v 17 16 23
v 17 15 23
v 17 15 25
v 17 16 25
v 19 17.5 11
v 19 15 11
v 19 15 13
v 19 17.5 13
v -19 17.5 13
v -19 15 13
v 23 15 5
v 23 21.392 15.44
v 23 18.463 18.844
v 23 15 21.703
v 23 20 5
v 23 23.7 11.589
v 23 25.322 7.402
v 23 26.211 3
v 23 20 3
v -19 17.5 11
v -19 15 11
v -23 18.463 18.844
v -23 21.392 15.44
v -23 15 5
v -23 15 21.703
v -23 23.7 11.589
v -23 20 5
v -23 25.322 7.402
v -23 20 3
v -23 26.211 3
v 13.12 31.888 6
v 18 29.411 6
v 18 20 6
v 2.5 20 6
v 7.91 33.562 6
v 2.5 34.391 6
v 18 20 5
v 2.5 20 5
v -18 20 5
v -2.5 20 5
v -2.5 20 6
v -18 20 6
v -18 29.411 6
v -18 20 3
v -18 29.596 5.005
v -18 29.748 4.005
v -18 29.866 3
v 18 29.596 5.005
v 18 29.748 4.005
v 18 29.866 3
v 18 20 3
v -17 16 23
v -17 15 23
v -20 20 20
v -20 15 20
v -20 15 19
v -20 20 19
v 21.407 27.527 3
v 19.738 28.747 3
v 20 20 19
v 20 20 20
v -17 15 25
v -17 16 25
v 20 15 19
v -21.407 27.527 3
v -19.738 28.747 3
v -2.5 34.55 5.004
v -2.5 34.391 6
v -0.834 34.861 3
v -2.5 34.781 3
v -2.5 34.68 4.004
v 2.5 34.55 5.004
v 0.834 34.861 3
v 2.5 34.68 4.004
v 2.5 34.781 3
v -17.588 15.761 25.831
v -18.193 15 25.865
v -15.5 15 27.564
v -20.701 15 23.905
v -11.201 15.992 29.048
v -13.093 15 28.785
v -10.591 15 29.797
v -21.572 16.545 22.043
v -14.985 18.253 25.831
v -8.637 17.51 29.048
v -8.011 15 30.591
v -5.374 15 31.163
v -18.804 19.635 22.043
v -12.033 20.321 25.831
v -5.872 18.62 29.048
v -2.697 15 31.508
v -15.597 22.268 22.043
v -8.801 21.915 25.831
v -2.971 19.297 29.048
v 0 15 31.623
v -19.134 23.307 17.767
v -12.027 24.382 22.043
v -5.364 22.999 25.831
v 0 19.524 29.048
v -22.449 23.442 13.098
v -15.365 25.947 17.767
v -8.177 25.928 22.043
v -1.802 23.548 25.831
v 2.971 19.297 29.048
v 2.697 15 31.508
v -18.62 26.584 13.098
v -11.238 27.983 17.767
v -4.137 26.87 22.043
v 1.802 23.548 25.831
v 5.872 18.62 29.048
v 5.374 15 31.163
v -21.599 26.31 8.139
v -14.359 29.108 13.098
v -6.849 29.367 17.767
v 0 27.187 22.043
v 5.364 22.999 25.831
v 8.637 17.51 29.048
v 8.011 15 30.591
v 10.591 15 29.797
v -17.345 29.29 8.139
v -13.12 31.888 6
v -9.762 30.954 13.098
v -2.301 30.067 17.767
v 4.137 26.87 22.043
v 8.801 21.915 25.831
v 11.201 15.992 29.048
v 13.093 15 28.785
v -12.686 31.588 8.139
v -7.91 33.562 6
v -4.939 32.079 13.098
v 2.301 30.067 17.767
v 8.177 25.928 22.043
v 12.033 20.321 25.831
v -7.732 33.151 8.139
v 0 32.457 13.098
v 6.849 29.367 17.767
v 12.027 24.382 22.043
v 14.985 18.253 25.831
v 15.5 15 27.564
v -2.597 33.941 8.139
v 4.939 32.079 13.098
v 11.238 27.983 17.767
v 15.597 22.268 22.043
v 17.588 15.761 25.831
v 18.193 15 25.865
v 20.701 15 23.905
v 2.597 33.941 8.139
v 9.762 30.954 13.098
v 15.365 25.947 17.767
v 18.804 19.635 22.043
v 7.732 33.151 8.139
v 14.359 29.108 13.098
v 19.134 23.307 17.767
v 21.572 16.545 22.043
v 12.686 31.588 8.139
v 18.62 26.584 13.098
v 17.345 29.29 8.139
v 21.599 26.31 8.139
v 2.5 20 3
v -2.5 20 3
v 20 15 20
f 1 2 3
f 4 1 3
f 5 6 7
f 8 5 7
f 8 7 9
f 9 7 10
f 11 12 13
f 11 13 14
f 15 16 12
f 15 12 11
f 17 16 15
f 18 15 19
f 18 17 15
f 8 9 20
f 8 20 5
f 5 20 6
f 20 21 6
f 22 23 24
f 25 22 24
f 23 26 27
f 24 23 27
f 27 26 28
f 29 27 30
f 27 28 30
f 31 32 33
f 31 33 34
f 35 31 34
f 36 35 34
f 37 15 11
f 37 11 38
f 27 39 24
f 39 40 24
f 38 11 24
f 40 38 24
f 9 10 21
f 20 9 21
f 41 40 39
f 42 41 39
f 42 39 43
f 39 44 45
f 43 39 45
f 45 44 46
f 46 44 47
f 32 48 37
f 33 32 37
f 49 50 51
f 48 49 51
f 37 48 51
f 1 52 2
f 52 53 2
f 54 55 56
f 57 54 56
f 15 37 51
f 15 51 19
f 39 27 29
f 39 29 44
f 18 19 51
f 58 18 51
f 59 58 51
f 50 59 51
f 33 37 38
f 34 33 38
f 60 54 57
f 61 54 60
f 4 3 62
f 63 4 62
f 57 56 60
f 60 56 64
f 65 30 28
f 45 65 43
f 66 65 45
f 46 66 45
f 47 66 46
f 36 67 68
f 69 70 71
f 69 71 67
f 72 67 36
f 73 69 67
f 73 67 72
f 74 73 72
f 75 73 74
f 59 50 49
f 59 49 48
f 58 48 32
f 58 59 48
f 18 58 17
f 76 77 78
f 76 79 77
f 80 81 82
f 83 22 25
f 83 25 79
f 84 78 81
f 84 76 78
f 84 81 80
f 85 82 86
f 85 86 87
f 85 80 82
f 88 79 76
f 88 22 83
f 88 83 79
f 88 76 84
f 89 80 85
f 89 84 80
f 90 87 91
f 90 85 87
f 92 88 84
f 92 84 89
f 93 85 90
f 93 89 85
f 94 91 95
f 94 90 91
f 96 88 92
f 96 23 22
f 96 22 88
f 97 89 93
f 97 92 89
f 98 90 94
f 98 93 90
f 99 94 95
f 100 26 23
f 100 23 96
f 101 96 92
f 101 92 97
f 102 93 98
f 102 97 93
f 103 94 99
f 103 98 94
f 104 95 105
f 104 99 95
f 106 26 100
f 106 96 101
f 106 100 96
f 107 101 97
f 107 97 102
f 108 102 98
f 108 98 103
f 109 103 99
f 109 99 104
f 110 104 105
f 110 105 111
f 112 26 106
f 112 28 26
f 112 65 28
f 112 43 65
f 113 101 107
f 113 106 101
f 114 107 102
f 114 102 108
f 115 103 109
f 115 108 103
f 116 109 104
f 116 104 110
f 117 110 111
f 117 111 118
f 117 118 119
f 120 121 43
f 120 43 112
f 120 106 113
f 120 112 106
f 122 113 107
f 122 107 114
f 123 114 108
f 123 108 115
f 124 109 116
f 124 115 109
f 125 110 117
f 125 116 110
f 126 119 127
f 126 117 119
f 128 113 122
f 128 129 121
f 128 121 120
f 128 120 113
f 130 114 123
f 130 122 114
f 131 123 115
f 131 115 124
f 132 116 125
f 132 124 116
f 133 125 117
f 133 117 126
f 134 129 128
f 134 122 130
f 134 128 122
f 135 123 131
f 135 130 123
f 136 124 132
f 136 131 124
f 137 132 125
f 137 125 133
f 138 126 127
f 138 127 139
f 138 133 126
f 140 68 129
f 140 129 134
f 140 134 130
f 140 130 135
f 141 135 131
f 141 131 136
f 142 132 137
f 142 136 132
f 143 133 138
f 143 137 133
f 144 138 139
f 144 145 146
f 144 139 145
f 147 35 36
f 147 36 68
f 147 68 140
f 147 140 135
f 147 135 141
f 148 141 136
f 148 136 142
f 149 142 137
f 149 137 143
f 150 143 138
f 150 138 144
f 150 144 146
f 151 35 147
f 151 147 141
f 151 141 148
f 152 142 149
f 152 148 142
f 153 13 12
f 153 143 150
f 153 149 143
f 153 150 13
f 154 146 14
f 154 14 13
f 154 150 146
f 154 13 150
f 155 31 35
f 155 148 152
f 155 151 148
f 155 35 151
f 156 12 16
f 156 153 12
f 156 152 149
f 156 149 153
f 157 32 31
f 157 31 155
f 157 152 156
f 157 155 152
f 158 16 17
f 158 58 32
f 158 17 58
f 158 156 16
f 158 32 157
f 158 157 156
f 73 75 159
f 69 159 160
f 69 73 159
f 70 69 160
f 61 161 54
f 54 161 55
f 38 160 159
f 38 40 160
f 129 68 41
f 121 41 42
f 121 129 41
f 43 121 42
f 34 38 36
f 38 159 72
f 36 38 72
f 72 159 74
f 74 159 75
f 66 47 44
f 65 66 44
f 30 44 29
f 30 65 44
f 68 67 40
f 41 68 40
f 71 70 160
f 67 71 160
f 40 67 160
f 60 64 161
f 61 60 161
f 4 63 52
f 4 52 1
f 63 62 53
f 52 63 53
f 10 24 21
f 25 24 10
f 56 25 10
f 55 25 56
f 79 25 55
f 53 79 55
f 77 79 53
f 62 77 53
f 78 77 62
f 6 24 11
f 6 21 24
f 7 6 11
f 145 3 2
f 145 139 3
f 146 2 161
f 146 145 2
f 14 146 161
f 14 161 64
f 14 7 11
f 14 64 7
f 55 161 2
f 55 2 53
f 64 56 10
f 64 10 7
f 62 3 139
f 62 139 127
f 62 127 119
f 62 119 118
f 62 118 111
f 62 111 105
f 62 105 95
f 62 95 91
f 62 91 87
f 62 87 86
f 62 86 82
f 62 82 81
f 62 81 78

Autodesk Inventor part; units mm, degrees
ref_plane "YZ Plane" through (0, 0, 0) normal (1, 0, 0) x (0, 1, 0)
sketch "スケッチ1" plane through (0, 0, 0) normal (0, 1, 0) x (-1, 0, 0)
  circle A0 centre (0, 0) radius 35
  line L0 (0, 0) -> (0, -35)
  line L1 (0, 0) -> (0, 35)
  dimension "d0" = 70
revolve "回転1" add sketch "スケッチ1" angle 180 about axis through (0, 0, 0) along (0, 0, 1) picked at (-2.5961, -23.0408) contours L1 L0 A0
sketch "スケッチ5" plane through (0, 0, 0) normal (0, -1, 0) x (1, 0, 0)
  line L0 (-20, -23) -> (20, -23)
  line L1 (20, -23) -> (20, -13)
  line L2 (20, -13) -> (-20, -13)
  line L3 (-20, -13) -> (-20, -23)
  line L4 (-20, -15) -> (-20, -13)
  line L5 (0, 25) -> (-17, 25)
  line L6 (-17, 25) -> (-17, 23)
  line L7 (-17, 23) -> (0, 23)
  line L8 (0, 23) -> (0, 25)
  line L9 (0, 20) -> (-20, 20)
  line L10 (-20, 20) -> (-20, 19)
  line L11 (-20, 19) -> (0, 19)
  line L12 (0, 19) -> (0, 20)
  line L13 (0, 13) -> (-19, 13)
  line L14 (-19, 13) -> (-19, 11)
  line L15 (-19, 11) -> (0, 11)
  line L16 (0, 11) -> (0, 13)
  line L17 (0, 5) -> (-23, 5)
  line L18 (-23, 5) -> (-23, 3)
  line L19 (-23, 3) -> (0, 3)
  line L20 (0, 3) -> (0, 5)
  circle A0 centre (0, 0) radius 35 projected
  circle A1 centre (0, 0) radius 35 projected
  line L21 (0, 35) -> (0, -35)
  line L22 (35, 0) -> (-35, 0)
  line L23 (-32, 2) -> (-23, 2)
  line L24 (-23, 2) -> (-23, -8)
  line L25 (-23, -8) -> (-32, -8)
  line L26 (-32, -8) -> (-32, 2)
  line L27 (-23, -8.0262) -> (-23, 2)
  line L28 (-27, 22.2711) -> (-27, -22.2711)
  line L29 (-15.5, 25) -> (0, 25)
  line L30 (0, 25) -> (0, 35)
  line L31 (0, 35) -> (-15.5, 35)
  line L32 (-15.5, 35) -> (-15.5, 25)
  line L33 (-15.5, 23) -> (0, 23)
  line L34 (0, 23) -> (0, 20)
  line L35 (0, 20) -> (-15.5, 20)
  line L36 (-15.5, 20) -> (-15.5, 23)
  line L37 (-16, 13) -> (0, 13)
  line L38 (0, 13) -> (0, 19)
  line L39 (0, 19) -> (-16, 19)
  line L40 (-16, 19) -> (-16, 13)
  line L41 (-16, 11) -> (0, 11)
  line L42 (0, 11) -> (0, 5)
  line L43 (0, 5) -> (-16, 5)
  line L44 (-16, 5) -> (-16, 11)
  line L45 (-23, -3) -> (-39.6865, -3)
  line L46 (-23, -3) -> (-7.8337, -3)
  line L47 (-8, 3) -> (-23, 3)
  line L48 (-23, 3) -> (-23, -9)
  line L49 (-23, -9) -> (-8, -9)
  line L50 (-8, -9) -> (-8, 3)
  line L51 (-8, 3) -> (-23, -9) construction
  line L52 (-23, 3) -> (-8, -9) construction
  line L53 (-23, 4) -> (-33, 4)
  line L54 (-33, 4) -> (-33, -10)
  line L55 (-33, -10) -> (-23, -10)
  line L56 (-23, -10) -> (-23, 4)
  line L57 (-23, 4) -> (-33, -10) construction
  line L58 (-33, 4) -> (-23, -10) construction
  line L59 (-8, 3) -> (-1, 3)
  line L60 (-1, 3) -> (-1, -9)
  line L61 (-1, -9) -> (-8, -9)
  line L62 (-8, -9) -> (-8, 3)
  line L63 (-8, 3) -> (-1, -9) construction
  line L64 (-1, 3) -> (-8, -9) construction
  line L65 (-23, 2) -> (-27, 2)
  line L66 (-23, -8) -> (-27, -8)
  line L67 (-23, 4) -> (-27, 4)
  line L68 (-23, -10) -> (-27, -10)
  line L69 (23.4307, -26) -> (-23.4307, -26)
  line L70 (-8, 3) -> (-6.8, 3)
  line L71 (-6.8, 3) -> (-6.8, -9)
  line L72 (-6.8, -9) -> (-8, -9)
  line L73 (-8, -9) -> (-8, 3)
  line L74 (-3, 5) -> (0, 5)
  line L75 (0, 20) -> (-4, 20)
  line L76 (-4, 19) -> (0, 19)
  line L77 (0, 19) -> (0, 20)
  line L78 (-6, 5) -> (-1, 5)
  line L79 (-1, 3) -> (-6, 3)
  point P0 (0, -23)
  point P1 (0, -13)
  point P2 (0, 24)
  point P3 (0, 19.5)
  point P4 (0, 12)
  point P5 (0, 4)
  point P6 (-20, -18)
  point P7 (-27, -0.5262)
  point P8 (-27, -8)
  point P9 (-15.5, 21.5)
  point P10 (-15.5, 31.3807)
  point P11 (0, 25)
  point P12 (0, 23)
  point P13 (0, 11)
  point P14 (0, 13)
  point P15 (-27, 0)
  point P16 (-32, 0)
  point P17 (-23, 0)
  point P18 (-15.5, -3)
  point P19 (-28, -3)
  point P20 (-4.5, -3)
  point P21 (-8, -9)
  point P22 (-8, 3)
  point P23 (-27, 0.5)
  point P24 (-28, 0.4738)
  point P25 (-28, -11.5262)
  point P26 (-27, -11.5)
  point P27 (-23, 2)
  point P28 (-23, 2)
  point P29 (-8, 0)
  point P30 (-1, 0)
  point P31 (0, 19)
  point P32 (0, 20)
  point P33 (-27, -10)
  point P34 (-27, 4)
  dimension "d12" = 40
  dimension "d13" = 10
  dimension "d23" = 17
  dimension "d24" = 2
  dimension "d27" = 20
  dimension "d28" = 1
  dimension "d30" = 19
  dimension "d31" = 2
  dimension "d33" = 2
  dimension "d88" = 0
  dimension "d89" = 0
  dimension "d90" = 12
  dimension "d92" = 20
  dimension "d93" = 10
  dimension "d97" = 9
  dimension "d98" = 10
  dimension "d113" = 27
  dimension "d122" = 15.5
  dimension "d123" = 35
  dimension "d124" = 3
  dimension "d125" = 15.5
  dimension "d126" = 6
  dimension "d127" = 6
  dimension "d128" = 16
  dimension "d129" = 16
  dimension "d147" = 12
  dimension "d149" = 8
  dimension "d151" = 15
  dimension "d161" = 14
  dimension "d162" = 10
  dimension "d164" = 12
  dimension "d165" = 7
  dimension "d170" = 26
  dimension "d175" = 1.2
  dimension "d207" = 0
extrude "GNSボード" cut sketch "スケッチ5" against normal blind 16 contours L8 L7 L6 L5
extrude "GNSボード止めるよう" cut sketch "スケッチ5" against normal blind 15 contours L21 L5 L32 A0 | L21 L9 L36 L7
extrude "アルミ板１" cut sketch "スケッチ5" against normal blind 20 contours L11 L10 L9 L12
extrude "メイン基板" cut sketch "スケッチ5" against normal blind 17.5 contours L15 L14 L13 L16
extrude "メイン止めるよう" cut sketch "スケッチ5" against normal blind 14.5 contours L17 L44 L15 L21 | L13 L40 L11 L21
extrude "アルミ板２" cut sketch "スケッチ5" against normal blind 20 contours L19 L18 L17 L20
extrude "電池ボックス入れ" cut sketch "スケッチ5" against normal blind 13 contours L3 L2 L21 L0 | L21 L2 L1 L0
extrude "side ut" cut sketch "スケッチ5" against normal blind 100 contours A0 L45 L54 L55 L28 | A0 L22 L54 L45 | L55 L54 L45 L26 L25 L28 | A0 L28 L53 L54 L22 | L54 L22 L26 L45 | L25 L26 L45 L28 | L54 L53 L28 L23 L26 L22 | L26 L22 L28 L45 | L22 L26 L23 L28
extrude "motor case" add sketch "スケッチ5" against normal blind 7 contours L55 L54 L45 L26 L25 L28 | L28 L25 L27 L48 L56 L55 | L50 L46 L24 L22 | L22 L24 L48 L19 L50 | L54 L22 L26 L45 | L28 L45 L24 L25 | L25 L26 L45 L28 | L24 L45 L28 L22 | L22 L28 L23 L24 | L50 L49 L48 L27 L24 L46 | L54 L53 L28 L23 L26 L22 | L26 L22 L28 L45 | L53 L18 L48 L23 L28 | L22 L26 L23 L28
extrude "bottom cut" cut sketch "スケッチ5" against normal blind 90 contours L69 A0 L21 | L21 A0 L69
extrude "motor" cut sketch "スケッチ5" against normal blind 6 contours L60 L61 L71 L22 | L22 L71 L19 L60 | L71 L61 L50 L22 | L22 L50 L19 L71 | L50 L46 L24 L22 | L22 L24 L48 L19 L50 | L28 L45 L24 L25 | L25 L26 L45 L28 | L24 L45 L28 L22 | L22 L28 L23 L24 | L50 L49 L48 L27 L24 L46 | L26 L22 L28 L45 | L22 L26 L23 L28
extrude "motor block" add sketch "スケッチ5" against normal blind 10 contours L71 L61 L50 L22 | L22 L50 L19 L71
sketch "スケッチ27" plane through (-33, 0, -10) normal (-1, 0, 0) x (0, 0, 1)
  line L0 (14, 0) -> (0, 0) projected
  circle A0 centre (7, 0) radius 3
  point P0 (10, 0)
  dimension "d198" = 6
extrude "押し出し36" cut sketch "スケッチ27" against normal blind 27
mirror "ミラー13" about plane through (0, 0, 0) normal (1, 0, 0) of "メイン止めるよう", "メイン基板", "アルミ板１", "GNSボード止めるよう", "GNSボード", "アルミ板２", "motor", "motor case", "押し出し36", "電池ボックス入れ", "side ut", "motor block"
ref_plane "作業平面5" through (-17, 17.5, 23) normal (0, -1, 0) x (1, 0, 0)
ref_plane "作業平面6" through (20, 13, -13) normal (0, 0, -1) x (1, 0, 0)
sketch "スケッチ38" plane through (20, 13, -13) normal (0, 0, -1) x (1, 0, 0)
  line L0 (-40, 13) -> (0, 13) projected
  line L1 (-40, 13) -> (-40, 0) projected
  line L2 (-40, 0) -> (0, 0) projected
  line L3 (0, 13) -> (0, 0) projected
  line L4 (-38, 6) -> (-28, 6)
  line L5 (-28, 6) -> (-28, -3)
  line L6 (-28, -3) -> (-38, -3)
  line L7 (-38, -3) -> (-38, 6)
  point P0 (-20, 13)
  dimension "d235" = 3
  dimension "d236" = 9
  dimension "d237" = 10
  dimension "d238" = 2
extrude "押し出し44" cut sketch "スケッチ38" against normal blind 18 contours L7 L4 L5 L2 | L2 L5 L6 L7
ref_plane "作業平面7" through (27, 35, 4) normal (0, -1, 0) x (1, 0, 0)
sketch "スケッチ41" plane through (-17, 0, 23) normal (0, -1, 0) x (1, 0, 0)
  line L0 (-16, -23) -> (-15, -23) projected
  line L1 (-15, -23) -> (-15, -21) projected
  line L2 (-15, -21) -> (-6, -21) projected
  line L3 (-6, -21) -> (-6, -18) projected
  line L4 (-6, -18) -> (1, -18) projected
  line L5 (1, -18) -> (1, -12) projected
  line L6 (1, -12) -> (-2, -12) projected
  line L7 (-2, -12) -> (-2, -10) projected
  line L8 (-2, -10) -> (1, -10) projected
  line L9 (1, -10) -> (1, -4) projected
  line L10 (1, -4) -> (-3, -4) projected
  line L11 (-3, -4) -> (-3, -3) projected
  line L12 (-3, -3) -> (1.5, -3) projected
  line L13 (1.5, -3) -> (1.5, 0) projected
  line L14 (1.5, 0) -> (0, 0) projected
  line L15 (0, 0) -> (0, 2) projected
  line L16 (0, 2) -> (1.5, 2) projected
  line L17 (1.5, 2) -> (1.5, 8.3807) projected
  arc A0 (1.5, 8.3807) -> (-10, -0.7289) centre (17, -23) ccw projected
  line L18 (-10, -0.7289) -> (-10, -19) projected
  line L19 (-10, -19) -> (-16, -19) projected
  line L20 (-16, -19) -> (-16, -23) projected
  line L21 (1, -18) -> (1, -12) projected
  line L22 (-2, -10) -> (-2, -12) projected
  line L23 (0, 2) -> (0, 0) projected
  circle A1 centre (-4, 0) radius 2
  dimension "d252" = 4
  dimension "d253" = 4
  dimension "d254" = 3
extrude "押し出し46" cut sketch "スケッチ41" against normal blind 10 contours A1
mirror "ミラー15" about plane through (0, 0, 0) normal (1, 0, 0) of "押し出し46"
sketch "スケッチ42" plane through (-33, 0, -10) normal (0, -1, 0) x (1, 0, 0)
  circle A0 centre (9.5, -8) radius 2
  line L0 (13, -13) -> (13, -3) projected
  line L1 (10, 2) -> (1, 2) projected
  point P0 (33, 10)
  dimension "d257" = 3.5
  dimension "d258" = 4
  dimension "d259" = 10
extrude "押し出し47" cut sketch "スケッチ42" against normal blind 10
mirror "ミラー16" about plane through (0, 0, 0) normal (1, 0, 0) of "押し出し47"
ref_plane "作業平面8" through (-17, 15, 23) normal (0, -1, 0) x (1, 0, 0)
sketch "スケッチ45" plane through (-17, 15, 23) normal (0, -1, 0) x (1, 0, 0)
  circle A0 centre (-4, 0) radius 2 projected
  line L0 (-16, -23) -> (-15, -23) projected
  line L1 (-15, -23) -> (-15, -21) projected
  line L2 (-15, -21) -> (-6, -21) projected
  line L3 (-6, -21) -> (-6, -18) projected
  line L4 (-6, -18) -> (1, -18) projected
  line L5 (1, -18) -> (1, -12) projected
  line L6 (1, -12) -> (-2, -12) projected
  line L7 (-2, -12) -> (-2, -10) projected
  line L8 (-2, -10) -> (1, -10) projected
  line L9 (1, -10) -> (1, -4) projected
  line L10 (1, -4) -> (-3, -4) projected
  line L11 (-3, -4) -> (-3, -3) projected
  line L12 (-3, -3) -> (1.5, -3) projected
  line L13 (1.5, -3) -> (1.5, 0) projected
  line L14 (1.5, 0) -> (0, 0) projected
  line L15 (0, 0) -> (0, 2) projected
  line L16 (0, 2) -> (1.5, 2) projected
  line L17 (1.5, 2) -> (1.5, 8.3807) projected
  arc A1 (1.5, 8.3807) -> (-10, -0.7289) centre (17, -23) ccw projected
  line L18 (-10, -0.7289) -> (-10, -19) projected
  line L19 (-10, -19) -> (-16, -19) projected
  line L20 (-16, -19) -> (-16, -23) projected
  arc A2 (32.5, 4.5636) -> (1.5, 4.5636) centre (17, -23) ccw projected
  line L21 (1.5, 2) -> (1.5, 4.5636) projected
  line L22 (32.5, 2) -> (1.5, 2) projected
  line L23 (32.5, 2) -> (32.5, 4.5636) projected
  circle A3 centre (38, 0) radius 2 projected
  circle A4 centre (38, 0) radius 2 projected
  line L24 (49, -23) -> (50, -23) projected
  line L25 (50, -19) -> (50, -23) projected
  line L26 (44, -19) -> (50, -19) projected
  line L27 (44, -19) -> (44, -0.7289) projected
  arc A5 (44, -0.7289) -> (32.5, 8.3807) centre (17, -23) ccw projected
  line L28 (32.5, 8.3807) -> (32.5, 2) projected
  line L29 (32.5, 2) -> (34, 2) projected
  line L30 (34, 2) -> (34, 0) projected
  line L31 (34, 0) -> (32.5, 0) projected
  line L32 (32.5, 0) -> (32.5, -3) projected
  line L33 (32.5, -3) -> (37, -3) projected
  line L34 (37, -3) -> (37, -4) projected
  line L35 (37, -4) -> (33, -4) projected
  line L36 (33, -4) -> (33, -10) projected
  line L37 (33, -10) -> (36, -10) projected
  line L38 (36, -10) -> (36, -12) projected
  line L39 (36, -12) -> (33, -12) projected
  line L40 (33, -12) -> (33, -18) projected
  line L41 (33, -18) -> (40, -18) projected
  line L42 (40, -18) -> (40, -21) projected
  line L43 (40, -21) -> (49, -21) projected
  line L44 (49, -21) -> (49, -23) projected
  circle A6 centre (-4, 0) radius 2 projected
  line L45 (1.5, 0) -> (32.5, 0) projected
  line L46 (32.5, -3) -> (1.5, -3) projected
  line L47 (32.5, -3) -> (32.5, 0) projected
  line L48 (1.5, 0) -> (32.5, 0) projected
  line L49 (1.5, -3) -> (1.5, 0) projected
  line L50 (34, 0) -> (0, 0) projected
  line L51 (34, 0) -> (34, 2) projected
  line L52 (34, 2) -> (0, 2) projected
  line L53 (0, 0) -> (0, 2) projected
  line L54 (33, -10) -> (1, -10) projected
  line L55 (33, -10) -> (33, -4) projected
  line L56 (1, -4) -> (33, -4) projected
  line L57 (1, -10) -> (1, -4) projected
  line L58 (36, -12) -> (-2, -12) projected
  line L59 (36, -12) -> (36, -10) projected
  line L60 (36, -10) -> (-2, -10) projected
  line L61 (-2, -12) -> (-2, -10) projected
  line L62 (33, -18) -> (1, -18) projected
  line L63 (33, -18) -> (33, -12) projected
  line L64 (1, -12) -> (33, -12) projected
  line L65 (1, -18) -> (1, -12) projected
  line L66 (40, -20) -> (-6, -20) projected
  line L67 (40, -20) -> (40, -18) projected
  line L68 (40, -18) -> (-6, -18) projected
  line L69 (-6, -20) -> (-6, -18) projected
  circle A7 centre (40.5, -41) radius 2 projected
  circle A8 centre (-6.5, -41) radius 2 projected
  line L70 (25, -29) -> (23.8, -29) projected
  line L71 (23.8, -32) -> (23.8, -29) projected
  line L72 (23.8, -32) -> (18, -32) projected
  line L73 (18, -32) -> (18, -20) projected
  line L74 (18, -20) -> (16, -20) projected
  line L75 (16, -20) -> (16, -32) projected
  line L76 (16, -32) -> (10.2, -32) projected
  line L77 (10.2, -32) -> (10.2, -29) projected
  line L78 (10.2, -29) -> (9, -29) projected
  line L79 (9, -29) -> (9, -32) projected
  line L80 (9, -32) -> (-6, -32) projected
  line L81 (-6, -32) -> (-6, -31) projected
  line L82 (-6, -31) -> (-15, -31) projected
  line L83 (-15, -31) -> (-15, -29) projected
  line L84 (-15, -29) -> (-16, -29) projected
  line L85 (-16, -29) -> (-16, -33) projected
  line L86 (-16, -33) -> (-10, -33) projected
  line L87 (-10, -33) -> (-10, -45.2711) projected
  arc A9 (-10, -45.2711) -> (-6.4307, -49) centre (17, -23) ccw projected
  line L88 (-6.4307, -49) -> (40.4307, -49) projected
  arc A10 (40.4307, -49) -> (44, -45.2711) centre (17, -23) ccw projected
  line L89 (44, -45.2711) -> (44, -33) projected
  line L90 (50, -33) -> (44, -33) projected
  line L91 (50, -29) -> (50, -33) projected
  line L92 (50, -29) -> (49, -29) projected
  line L93 (49, -29) -> (49, -31) projected
  line L94 (49, -31) -> (40, -31) projected
  line L95 (40, -31) -> (40, -32) projected
  line L96 (40, -32) -> (25, -32) projected
  line L97 (25, -29) -> (25, -32) projected
  line L98 (-3, -36) -> (37, -36) projected
  line L99 (37, -36) -> (37, -46) projected
  line L100 (37, -46) -> (-3, -46) projected
  line L101 (-3, -46) -> (-3, -36) projected
  line L102 (-6, -18) -> (40, -18)
  line L103 (40, -18) -> (40, 8.6228)
  line L104 (40, 8.6228) -> (-6, 8.6228)
  line L105 (-6, 8.6228) -> (-6, -18)
  arc A11 (32.5, 4.5636) -> (1.5, 4.5636) centre (17, -23) ccw projected
  line L106 (32.5, 4.5636) -> (32.5, 8.3807) projected
  arc A12 (44, -0.7289) -> (32.5, 8.3807) centre (17, -23) ccw projected
  line L107 (44, -0.7289) -> (44, -45.2711) projected
  arc A13 (40.4307, -49) -> (44, -45.2711) centre (17, -23) ccw projected
  line L108 (40.4307, -49) -> (-6.4307, -49) projected
  arc A14 (-10, -45.2711) -> (-6.4307, -49) centre (17, -23) ccw projected
  line L109 (-10, -45.2711) -> (-10, -0.7289) projected
  arc A15 (1.5, 8.3807) -> (-10, -0.7289) centre (17, -23) ccw projected
  line L110 (1.5, 8.3807) -> (1.5, 4.5636) projected
  line L111 (9, -32) -> (9, -20) projected
  line L112 (-6, -20) -> (9, -20) projected
  line L113 (-6, -21) -> (-6, -20) projected
  line L114 (-15, -21) -> (-6, -21) projected
  line L115 (-15, -31) -> (-15, -21) projected
  line L116 (-6, -31) -> (-15, -31) projected
  line L117 (-6, -32) -> (-6, -31) projected
  line L118 (9, -32) -> (-6, -32) projected
  line L119 (50, -29) -> (49, -29) projected
  line L120 (50, -23) -> (50, -29) projected
  line L121 (49, -23) -> (50, -23) projected
  line L122 (49, -29) -> (49, -23) projected
  line L123 (-16, -23) -> (-15, -23) projected
  line L124 (-16, -29) -> (-16, -23) projected
  line L125 (-15, -29) -> (-16, -29) projected
  line L126 (-15, -23) -> (-15, -29) projected
  point P0 (-10, -19)
  point P1 (40, 3.3818)
  point P2 (-6, -20)
  point P3 (-6, -18)
  point P4 (-6, 3.3818)
  point P5 (-10, -31)
  point P6 (44, -31)
  point P7 (-10, -19)
extrude "side and front cut" cut sketch "スケッチ45" along normal mid plane 100 contours L105 L3 L2 L109 L18 A1 | L66 L111 L79 L80 L81 L82 L109 L2 L3 | L109 L2 L1 L0 L20 L19 | L66 L75 L76 L77 L78 L111 | L109 L82 L83 L115 L1 L2 | L66 L73 L72 L71 L70 L97 L96 L95 L94 L107 L89 A10 L88 A9 L87 L109 L82 L81 L80 L79 L78 L77 L76 L75 | L103 A5 L27 L107 L43 L42 | L0 L115 L84 L124 | L109 L86 L85 L84 L83 L82 | L66 L42 L43 L107 L94 L95 L96 L97 L70 L71 L72 L73 | L26 L25 L24 L44 L43 L107 | L43 L44 L122 L93 L94 L107 | L94 L93 L92 L91 L90 L107 | L120 L92 L122 L24 | A7 | A8 | L98 L99 L100 L101
sketch "スケッチ46" plane through (-17, 15, 23) normal (0, -1, 0) x (1, 0, 0)
  line L0 (-6, 0) -> (-6, -18) projected
  line L1 (-6, -18) -> (1, -18) projected
  line L2 (1, -18) -> (1, -12) projected
  line L3 (1, -12) -> (-2, -12) projected
  line L4 (-2, -12) -> (-2, -10) projected
  line L5 (-2, -10) -> (1, -10) projected
  line L6 (1, -10) -> (1, -4) projected
  line L7 (1, -4) -> (-3, -4) projected
  line L8 (-3, -4) -> (-3, -3) projected
  line L9 (-3, -3) -> (1.5, -3) projected
  line L10 (1.5, -3) -> (1.5, 0) projected
  line L11 (1.5, 0) -> (0, 0) projected
  line L12 (0, 0) -> (0, 2) projected
  line L13 (0, 2) -> (1.5, 2) projected
  line L14 (1.5, 2) -> (1.5, 8.3807) projected
  arc A0 (1.5, 8.3807) -> (-6, 3.3818) centre (17, -23) ccw projected
  line L15 (-6, 3.3818) -> (-6, 0) projected
  circle A1 centre (-4, 0) radius 2 projected
  circle A2 centre (-4, 0) radius 2 projected
  line L16 (40, -18) -> (40, 0) projected
  circle A3 centre (38, 0) radius 2 projected
  line L17 (40, 0) -> (40, 3.3818) projected
  arc A4 (40, 3.3818) -> (32.5, 8.3807) centre (17, -23) ccw projected
  line L18 (32.5, 8.3807) -> (32.5, 2) projected
  line L19 (32.5, 2) -> (34, 2) projected
  line L20 (34, 2) -> (34, 0) projected
  line L21 (34, 0) -> (32.5, 0) projected
  line L22 (32.5, 0) -> (32.5, -3) projected
  line L23 (32.5, -3) -> (37, -3) projected
  line L24 (37, -3) -> (37, -4) projected
  line L25 (37, -4) -> (33, -4) projected
  line L26 (33, -4) -> (33, -10) projected
  line L27 (33, -10) -> (36, -10) projected
  line L28 (36, -10) -> (36, -12) projected
  line L29 (36, -12) -> (33, -12) projected
  line L30 (33, -12) -> (33, -18) projected
  line L31 (33, -18) -> (40, -18) projected
  arc A5 (32.5, 4.5636) -> (1.5, 4.5636) centre (17, -23) ccw projected
  line L32 (1.5, 2) -> (1.5, 4.5636) projected
  line L33 (32.5, 2) -> (1.5, 2) projected
  line L34 (32.5, 2) -> (32.5, 4.5636) projected
  line L35 (34, 0) -> (0, 0) projected
  line L36 (34, 0) -> (34, 2) projected
  line L37 (34, 2) -> (0, 2) projected
  line L38 (0, 0) -> (0, 2) projected
  line L39 (32.5, -3) -> (1.5, -3) projected
  line L40 (32.5, -3) -> (32.5, 0) projected
  line L41 (1.5, 0) -> (32.5, 0) projected
  line L42 (1.5, -3) -> (1.5, 0) projected
  line L43 (33, -10) -> (1, -10) projected
  line L44 (33, -10) -> (33, -4) projected
  line L45 (1, -4) -> (33, -4) projected
  line L46 (1, -10) -> (1, -4) projected
  line L47 (33, -18) -> (1, -18) projected
  line L48 (33, -18) -> (33, -12) projected
  line L49 (1, -12) -> (33, -12) projected
  line L50 (1, -18) -> (1, -12) projected
  point P0 (32.5, 4.5636)
  point P1 (1.5, 4.5636)
extrude "front cut 2" cut sketch "スケッチ46" along normal blind 100 contours L15 A0 L14 L13 L12 L11 L10 L9 L8 L7 L6 L5 L4 L3 L2 L1 L0 | A1 | L2 L49 L30 L47 | L3 L4 L5 L43 L27 L28 L29 L49 | A3 | L30 L29 L28 L27 L26 L25 L24 L23 L22 L21 L20 L19 L18 A4 L17 L16 L31 | A5 L18 L33 L14 | L33 L19 L20 L21 L35 L11 L12 L13 | L6 L45 L26 L43 | L7 L8 L9 L39 L23 L24 L25 L45 | L35 L22 L39 L10
sketch "スケッチ48" plane through (0, 0, 3) normal (0, 0, -1) x (-1, 0, 0)
  line L0 (-23, 20) -> (23, 20) projected
  line L1 (23, 26.2107) -> (23, 20) projected
  arc A0 (23, 26.2107) -> (-23, 26.2107) centre (0, 0) ccw projected
  line L2 (-23, 26.2107) -> (-23, 20) projected
  line L3 (-23, 15) -> (23, 15) projected
  line L4 (-23, 15) -> (-23, 20) projected
  line L5 (23, 15) -> (23, 20) projected
  line L6 (-23, 40) -> (-18, 40)
  line L7 (-18, 40) -> (-18, 15)
  line L8 (-18, 15) -> (-23, 15)
  line L9 (-23, 15) -> (-23, 40)
  line L10 (18, 40) -> (23, 40)
  line L11 (23, 40) -> (23, 15)
  line L12 (23, 15) -> (18, 15)
  line L13 (18, 15) -> (18, 40)
  line L14 (-2.5, 34.8712) -> (2.5, 34.8712)
  line L15 (2.5, 34.8712) -> (2.5, 20)
  line L16 (2.5, 20) -> (-2.5, 20)
  line L17 (-2.5, 20) -> (-2.5, 34.8712)
  line L18 (0, 0) -> (0, 34.8712)
  point P0 (18, 20)
  point P1 (18, 29.8664)
  point P2 (-18, 29.8664)
  point P3 (-18, 20)
  point P4 (2.5, 34.7815)
  point P5 (2.5, 20)
  point P6 (-2.5, 34.7815)
  dimension "d274" = 25
  dimension "d275" = 5
  dimension "d276" = 25
  dimension "d277" = 5
  dimension "d280" = 5
  dimension "d282" = 2.5
extrude "lock cut" cut sketch "スケッチ48" against normal blind 3 contours L7 A0 L17 L0 | L15 A0 L13 L0
properties part number "body back for main 3" material "ABS プラスチック"
